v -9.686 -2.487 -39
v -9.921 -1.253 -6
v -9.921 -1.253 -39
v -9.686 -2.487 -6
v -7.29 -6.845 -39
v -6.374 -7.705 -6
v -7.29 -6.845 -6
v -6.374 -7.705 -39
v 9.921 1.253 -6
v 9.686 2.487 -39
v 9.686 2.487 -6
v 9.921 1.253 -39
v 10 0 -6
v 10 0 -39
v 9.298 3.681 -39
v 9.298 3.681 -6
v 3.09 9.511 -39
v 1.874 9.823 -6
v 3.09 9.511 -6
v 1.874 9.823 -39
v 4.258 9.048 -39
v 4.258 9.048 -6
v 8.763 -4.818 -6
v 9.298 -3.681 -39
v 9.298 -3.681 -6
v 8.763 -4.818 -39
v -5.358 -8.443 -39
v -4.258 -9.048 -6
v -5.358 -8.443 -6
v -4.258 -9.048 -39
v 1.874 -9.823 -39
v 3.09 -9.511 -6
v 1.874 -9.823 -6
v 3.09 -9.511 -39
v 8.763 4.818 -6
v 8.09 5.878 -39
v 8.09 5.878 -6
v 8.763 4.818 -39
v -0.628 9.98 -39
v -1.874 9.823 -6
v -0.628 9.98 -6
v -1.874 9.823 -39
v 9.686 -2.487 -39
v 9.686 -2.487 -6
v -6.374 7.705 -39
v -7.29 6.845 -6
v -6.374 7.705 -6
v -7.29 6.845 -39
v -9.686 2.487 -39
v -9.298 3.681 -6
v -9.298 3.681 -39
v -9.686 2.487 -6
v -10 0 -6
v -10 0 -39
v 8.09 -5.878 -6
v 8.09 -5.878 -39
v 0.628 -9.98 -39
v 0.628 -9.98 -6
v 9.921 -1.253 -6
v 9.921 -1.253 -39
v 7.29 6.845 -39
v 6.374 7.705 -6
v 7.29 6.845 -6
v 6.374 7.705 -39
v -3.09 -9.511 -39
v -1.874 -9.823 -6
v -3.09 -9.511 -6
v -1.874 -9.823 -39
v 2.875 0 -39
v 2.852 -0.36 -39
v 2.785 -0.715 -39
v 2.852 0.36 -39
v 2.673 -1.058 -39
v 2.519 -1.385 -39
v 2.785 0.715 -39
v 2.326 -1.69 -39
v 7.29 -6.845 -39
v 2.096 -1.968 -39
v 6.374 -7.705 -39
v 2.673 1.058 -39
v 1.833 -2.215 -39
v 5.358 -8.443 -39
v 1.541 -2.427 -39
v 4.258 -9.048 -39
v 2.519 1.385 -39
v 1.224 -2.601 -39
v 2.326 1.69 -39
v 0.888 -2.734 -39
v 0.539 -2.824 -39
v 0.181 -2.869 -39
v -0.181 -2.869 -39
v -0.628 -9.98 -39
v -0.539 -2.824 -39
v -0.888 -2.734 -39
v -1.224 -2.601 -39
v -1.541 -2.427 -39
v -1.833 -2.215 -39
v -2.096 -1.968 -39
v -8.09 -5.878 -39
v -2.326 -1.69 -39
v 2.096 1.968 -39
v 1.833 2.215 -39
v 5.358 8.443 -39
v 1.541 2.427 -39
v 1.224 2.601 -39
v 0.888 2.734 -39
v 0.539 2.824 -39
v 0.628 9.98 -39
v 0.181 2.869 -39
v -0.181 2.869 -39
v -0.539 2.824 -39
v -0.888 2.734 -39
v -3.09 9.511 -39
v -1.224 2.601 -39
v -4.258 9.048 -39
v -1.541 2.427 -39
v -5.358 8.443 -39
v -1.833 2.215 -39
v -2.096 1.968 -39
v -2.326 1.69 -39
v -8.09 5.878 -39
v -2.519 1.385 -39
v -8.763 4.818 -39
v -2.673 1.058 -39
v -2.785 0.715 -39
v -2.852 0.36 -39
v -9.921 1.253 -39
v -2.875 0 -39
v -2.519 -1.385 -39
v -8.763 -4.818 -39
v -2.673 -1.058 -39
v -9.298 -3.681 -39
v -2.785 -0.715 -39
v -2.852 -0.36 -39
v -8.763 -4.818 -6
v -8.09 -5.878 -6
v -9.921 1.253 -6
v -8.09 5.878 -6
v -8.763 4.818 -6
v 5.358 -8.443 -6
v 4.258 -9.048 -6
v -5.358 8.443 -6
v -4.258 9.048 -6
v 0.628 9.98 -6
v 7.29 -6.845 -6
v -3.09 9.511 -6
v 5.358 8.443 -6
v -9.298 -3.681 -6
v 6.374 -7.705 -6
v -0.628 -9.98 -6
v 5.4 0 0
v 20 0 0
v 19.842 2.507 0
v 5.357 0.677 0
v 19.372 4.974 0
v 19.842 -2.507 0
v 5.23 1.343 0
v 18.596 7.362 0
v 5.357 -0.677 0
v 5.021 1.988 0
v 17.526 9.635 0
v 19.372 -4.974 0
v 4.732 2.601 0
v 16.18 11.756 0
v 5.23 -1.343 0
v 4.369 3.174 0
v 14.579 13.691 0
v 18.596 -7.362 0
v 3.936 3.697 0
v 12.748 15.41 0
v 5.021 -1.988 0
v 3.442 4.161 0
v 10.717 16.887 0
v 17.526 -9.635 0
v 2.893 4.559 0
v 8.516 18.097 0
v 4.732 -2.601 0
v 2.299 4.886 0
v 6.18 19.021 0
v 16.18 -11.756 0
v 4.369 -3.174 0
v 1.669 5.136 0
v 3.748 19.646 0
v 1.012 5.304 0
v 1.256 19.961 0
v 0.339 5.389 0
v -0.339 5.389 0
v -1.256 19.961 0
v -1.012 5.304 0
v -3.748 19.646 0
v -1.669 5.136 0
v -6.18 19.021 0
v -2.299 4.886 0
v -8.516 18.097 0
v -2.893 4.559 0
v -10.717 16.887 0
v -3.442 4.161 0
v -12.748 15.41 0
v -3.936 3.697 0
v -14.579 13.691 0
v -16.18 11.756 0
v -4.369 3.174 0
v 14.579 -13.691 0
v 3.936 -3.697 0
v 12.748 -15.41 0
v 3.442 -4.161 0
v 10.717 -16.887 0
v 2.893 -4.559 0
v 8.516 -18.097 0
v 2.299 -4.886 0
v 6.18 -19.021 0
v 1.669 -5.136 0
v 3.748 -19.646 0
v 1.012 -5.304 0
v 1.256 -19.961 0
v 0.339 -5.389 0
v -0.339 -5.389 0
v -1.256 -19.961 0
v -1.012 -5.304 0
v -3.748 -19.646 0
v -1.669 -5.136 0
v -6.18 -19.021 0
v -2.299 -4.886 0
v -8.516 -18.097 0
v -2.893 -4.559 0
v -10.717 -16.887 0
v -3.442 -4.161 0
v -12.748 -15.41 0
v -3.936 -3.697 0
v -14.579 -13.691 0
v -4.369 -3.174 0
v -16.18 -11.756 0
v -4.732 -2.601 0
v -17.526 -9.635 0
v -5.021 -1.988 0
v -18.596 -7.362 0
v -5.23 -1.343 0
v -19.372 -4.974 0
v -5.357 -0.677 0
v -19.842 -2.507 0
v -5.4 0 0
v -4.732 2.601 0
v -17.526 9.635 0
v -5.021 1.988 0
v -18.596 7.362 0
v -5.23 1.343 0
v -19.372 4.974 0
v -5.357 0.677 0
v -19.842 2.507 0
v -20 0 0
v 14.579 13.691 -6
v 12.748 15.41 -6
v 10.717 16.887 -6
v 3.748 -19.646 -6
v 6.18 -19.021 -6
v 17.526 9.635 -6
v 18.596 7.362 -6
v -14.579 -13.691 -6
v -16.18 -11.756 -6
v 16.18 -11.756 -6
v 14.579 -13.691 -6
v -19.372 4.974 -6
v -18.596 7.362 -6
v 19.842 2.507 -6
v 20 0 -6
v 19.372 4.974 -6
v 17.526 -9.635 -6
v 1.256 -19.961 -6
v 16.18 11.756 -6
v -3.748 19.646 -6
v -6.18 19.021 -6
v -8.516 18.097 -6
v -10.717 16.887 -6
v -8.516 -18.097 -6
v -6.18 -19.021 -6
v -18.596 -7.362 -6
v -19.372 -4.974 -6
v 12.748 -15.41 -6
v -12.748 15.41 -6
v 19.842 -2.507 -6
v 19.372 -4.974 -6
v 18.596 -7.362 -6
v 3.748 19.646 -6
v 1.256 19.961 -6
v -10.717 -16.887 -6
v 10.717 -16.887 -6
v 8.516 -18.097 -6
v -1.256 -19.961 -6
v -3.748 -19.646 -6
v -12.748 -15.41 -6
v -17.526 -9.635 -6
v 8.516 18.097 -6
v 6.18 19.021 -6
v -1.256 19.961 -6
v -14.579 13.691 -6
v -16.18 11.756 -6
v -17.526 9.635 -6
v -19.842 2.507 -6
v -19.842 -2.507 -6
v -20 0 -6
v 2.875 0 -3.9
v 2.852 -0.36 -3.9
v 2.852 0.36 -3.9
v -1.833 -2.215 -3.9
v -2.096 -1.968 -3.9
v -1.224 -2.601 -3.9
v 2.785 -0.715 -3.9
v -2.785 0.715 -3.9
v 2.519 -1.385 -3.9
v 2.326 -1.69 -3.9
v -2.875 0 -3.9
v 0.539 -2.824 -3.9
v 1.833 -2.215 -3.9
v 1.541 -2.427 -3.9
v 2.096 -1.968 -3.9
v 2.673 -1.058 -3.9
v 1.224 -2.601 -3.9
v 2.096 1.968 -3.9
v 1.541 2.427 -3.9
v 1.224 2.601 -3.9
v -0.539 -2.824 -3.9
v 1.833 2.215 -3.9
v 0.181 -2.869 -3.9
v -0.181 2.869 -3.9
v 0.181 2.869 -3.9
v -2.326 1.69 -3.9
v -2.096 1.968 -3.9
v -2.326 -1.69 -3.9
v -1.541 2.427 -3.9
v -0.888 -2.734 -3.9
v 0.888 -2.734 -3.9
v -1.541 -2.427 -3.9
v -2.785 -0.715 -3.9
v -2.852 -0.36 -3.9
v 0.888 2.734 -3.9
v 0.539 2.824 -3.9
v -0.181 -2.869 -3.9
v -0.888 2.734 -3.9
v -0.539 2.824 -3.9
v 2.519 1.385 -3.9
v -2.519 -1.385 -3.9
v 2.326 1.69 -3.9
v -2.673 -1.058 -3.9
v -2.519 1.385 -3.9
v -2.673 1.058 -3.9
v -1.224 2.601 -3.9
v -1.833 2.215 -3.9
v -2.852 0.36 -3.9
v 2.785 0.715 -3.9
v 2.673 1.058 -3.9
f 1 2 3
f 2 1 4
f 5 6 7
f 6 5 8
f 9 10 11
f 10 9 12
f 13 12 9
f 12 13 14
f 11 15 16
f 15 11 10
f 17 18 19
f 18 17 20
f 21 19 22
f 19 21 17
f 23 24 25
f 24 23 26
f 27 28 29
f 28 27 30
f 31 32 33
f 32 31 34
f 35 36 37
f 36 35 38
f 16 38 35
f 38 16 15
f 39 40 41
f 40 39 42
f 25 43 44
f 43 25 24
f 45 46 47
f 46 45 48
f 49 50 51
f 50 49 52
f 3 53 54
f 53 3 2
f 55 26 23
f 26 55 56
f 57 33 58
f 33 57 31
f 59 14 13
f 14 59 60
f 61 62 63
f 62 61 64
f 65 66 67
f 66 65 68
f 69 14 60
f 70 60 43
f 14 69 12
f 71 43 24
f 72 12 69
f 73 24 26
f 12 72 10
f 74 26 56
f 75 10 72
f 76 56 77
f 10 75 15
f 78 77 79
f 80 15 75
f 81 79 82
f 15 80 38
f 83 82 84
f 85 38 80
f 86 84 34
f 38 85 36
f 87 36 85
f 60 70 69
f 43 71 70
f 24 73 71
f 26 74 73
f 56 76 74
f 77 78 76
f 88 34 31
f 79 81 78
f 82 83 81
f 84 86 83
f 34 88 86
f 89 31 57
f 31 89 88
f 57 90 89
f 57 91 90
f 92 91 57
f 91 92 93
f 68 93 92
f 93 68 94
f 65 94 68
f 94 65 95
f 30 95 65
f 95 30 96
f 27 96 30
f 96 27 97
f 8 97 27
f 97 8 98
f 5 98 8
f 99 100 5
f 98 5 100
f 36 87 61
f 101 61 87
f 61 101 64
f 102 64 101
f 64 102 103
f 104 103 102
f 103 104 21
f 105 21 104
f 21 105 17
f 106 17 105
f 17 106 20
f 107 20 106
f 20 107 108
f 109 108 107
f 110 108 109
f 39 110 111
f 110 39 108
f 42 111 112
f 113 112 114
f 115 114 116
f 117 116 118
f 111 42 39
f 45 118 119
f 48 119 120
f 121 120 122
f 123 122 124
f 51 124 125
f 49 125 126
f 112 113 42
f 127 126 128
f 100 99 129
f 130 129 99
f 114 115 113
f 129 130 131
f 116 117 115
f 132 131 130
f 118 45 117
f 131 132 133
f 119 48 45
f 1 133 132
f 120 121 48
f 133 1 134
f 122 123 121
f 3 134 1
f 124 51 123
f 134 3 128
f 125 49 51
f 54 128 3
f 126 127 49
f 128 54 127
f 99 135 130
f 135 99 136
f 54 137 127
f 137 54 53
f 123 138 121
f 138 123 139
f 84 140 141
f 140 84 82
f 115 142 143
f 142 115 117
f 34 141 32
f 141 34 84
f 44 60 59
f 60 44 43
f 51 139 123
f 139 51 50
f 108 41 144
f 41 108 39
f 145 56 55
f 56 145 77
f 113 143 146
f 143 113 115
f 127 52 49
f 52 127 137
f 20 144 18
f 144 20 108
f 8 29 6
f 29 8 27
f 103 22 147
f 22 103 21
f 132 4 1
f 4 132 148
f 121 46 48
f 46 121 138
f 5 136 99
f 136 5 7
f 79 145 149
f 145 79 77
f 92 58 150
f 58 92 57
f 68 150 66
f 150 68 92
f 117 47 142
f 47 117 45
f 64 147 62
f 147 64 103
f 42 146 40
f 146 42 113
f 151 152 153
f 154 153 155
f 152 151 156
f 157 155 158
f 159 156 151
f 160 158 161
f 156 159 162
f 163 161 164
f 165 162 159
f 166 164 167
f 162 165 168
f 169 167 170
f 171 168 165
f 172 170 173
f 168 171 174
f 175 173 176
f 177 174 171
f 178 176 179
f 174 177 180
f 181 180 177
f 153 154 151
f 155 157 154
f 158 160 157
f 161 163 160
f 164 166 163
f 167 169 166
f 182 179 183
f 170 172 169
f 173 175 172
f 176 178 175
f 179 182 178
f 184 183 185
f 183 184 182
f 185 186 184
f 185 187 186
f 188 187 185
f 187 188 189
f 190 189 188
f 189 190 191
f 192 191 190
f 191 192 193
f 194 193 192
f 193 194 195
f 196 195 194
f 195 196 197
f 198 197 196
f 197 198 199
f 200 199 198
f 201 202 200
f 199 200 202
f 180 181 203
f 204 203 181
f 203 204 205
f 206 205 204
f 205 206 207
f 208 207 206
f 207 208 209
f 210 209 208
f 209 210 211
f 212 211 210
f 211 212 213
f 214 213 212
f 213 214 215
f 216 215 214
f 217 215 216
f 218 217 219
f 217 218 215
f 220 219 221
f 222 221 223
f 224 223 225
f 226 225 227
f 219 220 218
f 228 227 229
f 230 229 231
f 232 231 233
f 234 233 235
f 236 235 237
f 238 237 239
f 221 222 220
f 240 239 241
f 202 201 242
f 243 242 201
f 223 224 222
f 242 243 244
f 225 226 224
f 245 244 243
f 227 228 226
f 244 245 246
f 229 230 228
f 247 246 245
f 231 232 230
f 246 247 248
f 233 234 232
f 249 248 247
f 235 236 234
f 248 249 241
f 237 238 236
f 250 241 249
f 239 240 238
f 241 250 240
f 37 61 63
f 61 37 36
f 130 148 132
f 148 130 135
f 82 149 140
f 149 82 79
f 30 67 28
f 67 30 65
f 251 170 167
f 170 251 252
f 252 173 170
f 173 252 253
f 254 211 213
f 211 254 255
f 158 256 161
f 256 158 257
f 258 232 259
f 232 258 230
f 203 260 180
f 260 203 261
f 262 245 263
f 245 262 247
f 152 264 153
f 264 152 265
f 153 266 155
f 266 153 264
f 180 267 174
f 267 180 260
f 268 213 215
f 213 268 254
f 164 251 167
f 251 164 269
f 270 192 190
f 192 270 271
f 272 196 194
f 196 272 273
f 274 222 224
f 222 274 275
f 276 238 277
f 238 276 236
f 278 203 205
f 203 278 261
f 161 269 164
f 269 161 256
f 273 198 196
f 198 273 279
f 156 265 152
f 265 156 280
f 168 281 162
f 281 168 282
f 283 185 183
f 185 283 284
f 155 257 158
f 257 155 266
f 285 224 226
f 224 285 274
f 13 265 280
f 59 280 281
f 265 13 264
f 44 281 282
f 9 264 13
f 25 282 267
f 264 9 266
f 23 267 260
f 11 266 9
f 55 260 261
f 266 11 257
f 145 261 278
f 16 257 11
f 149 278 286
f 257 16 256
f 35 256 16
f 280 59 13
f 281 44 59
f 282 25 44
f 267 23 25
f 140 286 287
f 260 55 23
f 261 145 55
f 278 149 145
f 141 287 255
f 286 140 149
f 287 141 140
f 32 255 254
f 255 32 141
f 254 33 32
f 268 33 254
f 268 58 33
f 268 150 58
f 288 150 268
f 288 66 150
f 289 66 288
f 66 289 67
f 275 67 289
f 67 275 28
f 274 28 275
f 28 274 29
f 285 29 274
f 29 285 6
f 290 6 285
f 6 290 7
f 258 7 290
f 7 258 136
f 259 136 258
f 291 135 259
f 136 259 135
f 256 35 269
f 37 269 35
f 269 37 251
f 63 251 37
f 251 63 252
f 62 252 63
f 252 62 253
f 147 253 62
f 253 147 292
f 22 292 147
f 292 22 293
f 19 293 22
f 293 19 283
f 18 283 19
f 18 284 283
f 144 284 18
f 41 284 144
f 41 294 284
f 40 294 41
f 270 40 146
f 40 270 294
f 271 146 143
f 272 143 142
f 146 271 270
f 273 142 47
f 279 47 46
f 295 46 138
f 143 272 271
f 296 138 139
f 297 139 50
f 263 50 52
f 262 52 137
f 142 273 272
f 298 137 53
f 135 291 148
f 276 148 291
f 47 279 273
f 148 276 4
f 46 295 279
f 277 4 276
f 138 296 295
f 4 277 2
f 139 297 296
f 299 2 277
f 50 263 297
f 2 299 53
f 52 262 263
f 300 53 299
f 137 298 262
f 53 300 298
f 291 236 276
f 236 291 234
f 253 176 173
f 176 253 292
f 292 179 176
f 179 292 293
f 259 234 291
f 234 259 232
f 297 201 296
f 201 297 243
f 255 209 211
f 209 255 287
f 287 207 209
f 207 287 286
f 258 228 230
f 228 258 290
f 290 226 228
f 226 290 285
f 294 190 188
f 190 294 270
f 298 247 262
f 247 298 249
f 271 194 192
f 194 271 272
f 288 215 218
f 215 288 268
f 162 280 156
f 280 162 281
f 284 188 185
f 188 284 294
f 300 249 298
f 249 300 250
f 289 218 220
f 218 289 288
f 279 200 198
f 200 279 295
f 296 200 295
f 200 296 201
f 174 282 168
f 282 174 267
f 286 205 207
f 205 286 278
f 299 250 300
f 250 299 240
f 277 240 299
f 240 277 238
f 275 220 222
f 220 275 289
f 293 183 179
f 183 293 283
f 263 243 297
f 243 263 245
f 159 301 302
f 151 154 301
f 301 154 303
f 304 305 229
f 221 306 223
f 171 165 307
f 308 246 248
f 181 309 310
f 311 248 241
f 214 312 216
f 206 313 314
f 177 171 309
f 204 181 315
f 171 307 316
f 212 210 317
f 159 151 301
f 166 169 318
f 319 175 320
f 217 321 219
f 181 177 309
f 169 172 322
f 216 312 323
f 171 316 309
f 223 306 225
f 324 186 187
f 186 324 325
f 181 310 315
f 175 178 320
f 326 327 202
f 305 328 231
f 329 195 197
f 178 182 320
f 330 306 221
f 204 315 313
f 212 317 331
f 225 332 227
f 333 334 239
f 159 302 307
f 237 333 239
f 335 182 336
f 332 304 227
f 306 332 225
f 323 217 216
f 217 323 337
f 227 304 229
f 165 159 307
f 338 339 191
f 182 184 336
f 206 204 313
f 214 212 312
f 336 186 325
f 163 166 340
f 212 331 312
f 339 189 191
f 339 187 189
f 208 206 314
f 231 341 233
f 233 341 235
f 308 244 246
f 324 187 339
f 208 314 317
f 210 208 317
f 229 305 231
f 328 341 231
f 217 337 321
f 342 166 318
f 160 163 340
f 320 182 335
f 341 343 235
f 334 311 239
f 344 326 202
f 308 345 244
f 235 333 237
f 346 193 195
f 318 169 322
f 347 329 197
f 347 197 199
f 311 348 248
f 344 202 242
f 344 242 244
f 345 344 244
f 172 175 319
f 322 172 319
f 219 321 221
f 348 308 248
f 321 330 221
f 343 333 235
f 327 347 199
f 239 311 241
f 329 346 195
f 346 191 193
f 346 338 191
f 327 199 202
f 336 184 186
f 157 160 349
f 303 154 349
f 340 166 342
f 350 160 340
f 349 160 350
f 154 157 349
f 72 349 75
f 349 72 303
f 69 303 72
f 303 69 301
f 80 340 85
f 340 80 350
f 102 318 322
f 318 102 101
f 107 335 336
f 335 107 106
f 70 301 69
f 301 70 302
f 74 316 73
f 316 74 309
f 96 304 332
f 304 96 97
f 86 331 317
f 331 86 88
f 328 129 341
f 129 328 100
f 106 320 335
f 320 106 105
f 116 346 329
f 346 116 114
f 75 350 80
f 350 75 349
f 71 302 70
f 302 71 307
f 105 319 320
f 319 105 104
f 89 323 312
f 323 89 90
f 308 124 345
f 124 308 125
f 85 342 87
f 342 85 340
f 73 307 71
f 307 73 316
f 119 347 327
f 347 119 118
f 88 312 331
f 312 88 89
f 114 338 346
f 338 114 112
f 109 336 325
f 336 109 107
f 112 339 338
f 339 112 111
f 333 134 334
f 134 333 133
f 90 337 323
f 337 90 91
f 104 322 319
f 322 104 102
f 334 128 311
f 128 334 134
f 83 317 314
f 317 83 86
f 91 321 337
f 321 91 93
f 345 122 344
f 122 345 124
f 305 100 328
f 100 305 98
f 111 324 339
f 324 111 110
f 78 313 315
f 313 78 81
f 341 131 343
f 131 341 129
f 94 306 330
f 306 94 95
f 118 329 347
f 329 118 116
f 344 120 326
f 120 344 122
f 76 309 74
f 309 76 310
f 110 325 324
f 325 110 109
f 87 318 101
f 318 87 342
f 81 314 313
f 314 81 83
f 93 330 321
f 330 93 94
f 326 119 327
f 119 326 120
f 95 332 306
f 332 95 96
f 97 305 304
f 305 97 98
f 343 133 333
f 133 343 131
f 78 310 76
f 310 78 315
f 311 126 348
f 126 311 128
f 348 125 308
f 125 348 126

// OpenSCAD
$fn = 50;


difference() {
	union() {
		translate(v = [0, 0, -39.0000000000]) {
			cylinder(h = 39, r = 10.0000000000);
		}
		translate(v = [0, 0, -6.0000000000]) {
			cylinder(h = 6, r = 20.0000000000);
		}
	}
	union() {
		translate(v = [0, 0, 0]) {
			rotate(a = [0, 0, 0]) {
				difference() {
					union() {
						#translate(v = [0, 0, -39.0000000000]) {
							cylinder(h = 39, r = 2.6000000000);
						}
						#translate(v = [0, 0, -3.9000000000]) {
							cylinder(h = 3.9000000000, r1 = 2.8750000000, r2 = 5.4000000000);
						}
						#translate(v = [0, 0, -39.0000000000]) {
							cylinder(h = 39, r = 2.8750000000);
						}
						#translate(v = [0, 0, -39.0000000000]) {
							cylinder(h = 39, r = 2.6000000000);
						}
					}
					union();
				}
			}
		}
	}
}
